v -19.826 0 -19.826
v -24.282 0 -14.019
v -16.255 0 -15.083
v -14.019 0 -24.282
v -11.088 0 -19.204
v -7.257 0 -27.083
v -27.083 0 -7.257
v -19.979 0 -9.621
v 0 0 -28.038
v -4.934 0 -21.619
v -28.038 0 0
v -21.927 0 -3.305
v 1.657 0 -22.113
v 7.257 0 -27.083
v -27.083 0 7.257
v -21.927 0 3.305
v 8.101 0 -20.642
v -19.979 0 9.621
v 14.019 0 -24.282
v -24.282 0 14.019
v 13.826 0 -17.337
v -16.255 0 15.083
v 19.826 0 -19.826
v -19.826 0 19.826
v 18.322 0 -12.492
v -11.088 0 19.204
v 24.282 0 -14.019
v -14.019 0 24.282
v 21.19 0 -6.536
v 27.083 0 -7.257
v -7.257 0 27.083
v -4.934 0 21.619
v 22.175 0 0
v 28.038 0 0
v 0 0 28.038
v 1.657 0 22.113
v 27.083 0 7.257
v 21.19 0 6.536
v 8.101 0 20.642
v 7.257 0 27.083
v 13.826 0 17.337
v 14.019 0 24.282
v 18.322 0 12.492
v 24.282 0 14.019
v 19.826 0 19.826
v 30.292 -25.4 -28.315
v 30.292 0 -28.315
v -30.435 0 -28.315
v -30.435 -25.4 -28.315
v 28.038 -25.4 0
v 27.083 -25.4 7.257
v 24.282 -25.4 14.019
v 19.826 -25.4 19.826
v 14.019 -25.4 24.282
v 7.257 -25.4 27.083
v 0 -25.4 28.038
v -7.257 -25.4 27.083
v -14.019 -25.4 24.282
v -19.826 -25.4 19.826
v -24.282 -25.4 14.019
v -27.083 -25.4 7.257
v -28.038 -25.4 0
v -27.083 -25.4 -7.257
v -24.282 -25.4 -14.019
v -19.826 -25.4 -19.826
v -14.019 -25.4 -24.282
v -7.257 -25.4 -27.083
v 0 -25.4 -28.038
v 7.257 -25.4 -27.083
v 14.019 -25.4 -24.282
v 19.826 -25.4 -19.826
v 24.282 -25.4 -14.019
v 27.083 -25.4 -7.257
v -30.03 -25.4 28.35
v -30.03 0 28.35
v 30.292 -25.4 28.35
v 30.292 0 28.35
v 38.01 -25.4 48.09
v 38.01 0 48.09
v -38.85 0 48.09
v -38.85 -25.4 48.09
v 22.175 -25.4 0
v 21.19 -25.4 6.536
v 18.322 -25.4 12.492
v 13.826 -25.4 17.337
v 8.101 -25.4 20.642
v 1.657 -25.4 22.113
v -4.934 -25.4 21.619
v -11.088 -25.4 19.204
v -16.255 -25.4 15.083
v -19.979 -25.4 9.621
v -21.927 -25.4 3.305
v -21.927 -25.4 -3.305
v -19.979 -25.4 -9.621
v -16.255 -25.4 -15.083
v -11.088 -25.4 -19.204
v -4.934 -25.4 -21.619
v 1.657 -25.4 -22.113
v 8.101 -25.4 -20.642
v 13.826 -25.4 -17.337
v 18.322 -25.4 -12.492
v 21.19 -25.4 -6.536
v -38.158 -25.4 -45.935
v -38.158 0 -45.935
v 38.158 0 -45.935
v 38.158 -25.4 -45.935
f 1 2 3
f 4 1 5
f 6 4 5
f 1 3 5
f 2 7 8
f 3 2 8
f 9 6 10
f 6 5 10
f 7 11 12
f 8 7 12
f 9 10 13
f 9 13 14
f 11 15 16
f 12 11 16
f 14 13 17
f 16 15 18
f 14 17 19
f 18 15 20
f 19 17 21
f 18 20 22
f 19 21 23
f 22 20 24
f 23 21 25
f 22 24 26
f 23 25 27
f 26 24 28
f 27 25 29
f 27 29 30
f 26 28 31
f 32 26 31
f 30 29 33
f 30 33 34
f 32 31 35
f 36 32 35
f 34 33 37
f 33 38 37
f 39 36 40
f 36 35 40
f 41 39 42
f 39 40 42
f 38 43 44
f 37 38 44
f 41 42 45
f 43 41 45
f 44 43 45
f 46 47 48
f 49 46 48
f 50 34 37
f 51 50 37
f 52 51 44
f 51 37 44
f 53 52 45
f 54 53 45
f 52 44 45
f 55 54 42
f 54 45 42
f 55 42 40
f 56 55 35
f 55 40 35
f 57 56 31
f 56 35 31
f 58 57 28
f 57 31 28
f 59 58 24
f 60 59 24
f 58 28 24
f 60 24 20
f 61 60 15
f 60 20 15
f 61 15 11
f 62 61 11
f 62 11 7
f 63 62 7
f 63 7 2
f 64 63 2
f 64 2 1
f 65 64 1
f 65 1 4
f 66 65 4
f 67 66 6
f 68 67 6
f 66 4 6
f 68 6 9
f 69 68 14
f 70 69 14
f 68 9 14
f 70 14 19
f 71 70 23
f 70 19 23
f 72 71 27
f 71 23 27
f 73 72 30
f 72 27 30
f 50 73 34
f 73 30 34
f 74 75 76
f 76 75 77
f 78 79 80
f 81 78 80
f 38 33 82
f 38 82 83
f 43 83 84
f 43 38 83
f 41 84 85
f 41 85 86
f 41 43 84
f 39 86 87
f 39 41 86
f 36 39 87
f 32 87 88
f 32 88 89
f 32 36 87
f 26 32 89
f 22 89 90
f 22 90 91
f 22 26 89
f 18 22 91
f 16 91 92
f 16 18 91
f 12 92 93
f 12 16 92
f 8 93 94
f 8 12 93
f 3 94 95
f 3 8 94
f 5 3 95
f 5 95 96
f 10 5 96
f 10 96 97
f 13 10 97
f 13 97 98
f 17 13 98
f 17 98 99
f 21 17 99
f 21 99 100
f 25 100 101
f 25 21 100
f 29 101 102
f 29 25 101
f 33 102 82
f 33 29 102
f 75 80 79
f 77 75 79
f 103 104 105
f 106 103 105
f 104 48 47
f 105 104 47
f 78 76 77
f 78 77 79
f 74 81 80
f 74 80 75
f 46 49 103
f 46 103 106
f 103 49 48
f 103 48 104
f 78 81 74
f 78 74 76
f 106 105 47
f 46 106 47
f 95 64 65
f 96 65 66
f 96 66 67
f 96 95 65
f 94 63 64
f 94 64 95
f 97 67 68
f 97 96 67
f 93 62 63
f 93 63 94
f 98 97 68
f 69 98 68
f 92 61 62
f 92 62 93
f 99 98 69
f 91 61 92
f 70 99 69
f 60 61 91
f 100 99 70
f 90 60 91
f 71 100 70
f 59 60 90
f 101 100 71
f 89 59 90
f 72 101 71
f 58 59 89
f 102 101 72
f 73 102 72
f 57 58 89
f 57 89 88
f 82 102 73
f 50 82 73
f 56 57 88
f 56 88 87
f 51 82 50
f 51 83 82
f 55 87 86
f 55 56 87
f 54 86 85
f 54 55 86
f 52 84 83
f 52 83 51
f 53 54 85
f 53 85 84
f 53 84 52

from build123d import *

# Parameters (mm, degrees)
F0_R     = 28.038361
F0_R_2   = 22.175095
F1_DEPTH = 25.4


with BuildPart() as f1:
    # F0 (on Front) → F1 (new body)
    with BuildSketch(Plane.XZ):
        Polygon((38.157757, -45.935411), (30.291643, -28.315317), (-30.434743, -28.315317), (-38.157757, -45.935411), align=None)
        Circle(F0_R)
        Circle(F0_R_2, mode=Mode.SUBTRACT)
        Polygon((-38.850002, 48.09), (-30.030001, 28.350001), (30.291643, 28.350001), (38.009997, 48.09), (34.230001, 48.09), (-30.030001, 48.09), (-35.070002, 48.09), align=None)
    extrude(amount=F1_DEPTH)


solid = f1.part
